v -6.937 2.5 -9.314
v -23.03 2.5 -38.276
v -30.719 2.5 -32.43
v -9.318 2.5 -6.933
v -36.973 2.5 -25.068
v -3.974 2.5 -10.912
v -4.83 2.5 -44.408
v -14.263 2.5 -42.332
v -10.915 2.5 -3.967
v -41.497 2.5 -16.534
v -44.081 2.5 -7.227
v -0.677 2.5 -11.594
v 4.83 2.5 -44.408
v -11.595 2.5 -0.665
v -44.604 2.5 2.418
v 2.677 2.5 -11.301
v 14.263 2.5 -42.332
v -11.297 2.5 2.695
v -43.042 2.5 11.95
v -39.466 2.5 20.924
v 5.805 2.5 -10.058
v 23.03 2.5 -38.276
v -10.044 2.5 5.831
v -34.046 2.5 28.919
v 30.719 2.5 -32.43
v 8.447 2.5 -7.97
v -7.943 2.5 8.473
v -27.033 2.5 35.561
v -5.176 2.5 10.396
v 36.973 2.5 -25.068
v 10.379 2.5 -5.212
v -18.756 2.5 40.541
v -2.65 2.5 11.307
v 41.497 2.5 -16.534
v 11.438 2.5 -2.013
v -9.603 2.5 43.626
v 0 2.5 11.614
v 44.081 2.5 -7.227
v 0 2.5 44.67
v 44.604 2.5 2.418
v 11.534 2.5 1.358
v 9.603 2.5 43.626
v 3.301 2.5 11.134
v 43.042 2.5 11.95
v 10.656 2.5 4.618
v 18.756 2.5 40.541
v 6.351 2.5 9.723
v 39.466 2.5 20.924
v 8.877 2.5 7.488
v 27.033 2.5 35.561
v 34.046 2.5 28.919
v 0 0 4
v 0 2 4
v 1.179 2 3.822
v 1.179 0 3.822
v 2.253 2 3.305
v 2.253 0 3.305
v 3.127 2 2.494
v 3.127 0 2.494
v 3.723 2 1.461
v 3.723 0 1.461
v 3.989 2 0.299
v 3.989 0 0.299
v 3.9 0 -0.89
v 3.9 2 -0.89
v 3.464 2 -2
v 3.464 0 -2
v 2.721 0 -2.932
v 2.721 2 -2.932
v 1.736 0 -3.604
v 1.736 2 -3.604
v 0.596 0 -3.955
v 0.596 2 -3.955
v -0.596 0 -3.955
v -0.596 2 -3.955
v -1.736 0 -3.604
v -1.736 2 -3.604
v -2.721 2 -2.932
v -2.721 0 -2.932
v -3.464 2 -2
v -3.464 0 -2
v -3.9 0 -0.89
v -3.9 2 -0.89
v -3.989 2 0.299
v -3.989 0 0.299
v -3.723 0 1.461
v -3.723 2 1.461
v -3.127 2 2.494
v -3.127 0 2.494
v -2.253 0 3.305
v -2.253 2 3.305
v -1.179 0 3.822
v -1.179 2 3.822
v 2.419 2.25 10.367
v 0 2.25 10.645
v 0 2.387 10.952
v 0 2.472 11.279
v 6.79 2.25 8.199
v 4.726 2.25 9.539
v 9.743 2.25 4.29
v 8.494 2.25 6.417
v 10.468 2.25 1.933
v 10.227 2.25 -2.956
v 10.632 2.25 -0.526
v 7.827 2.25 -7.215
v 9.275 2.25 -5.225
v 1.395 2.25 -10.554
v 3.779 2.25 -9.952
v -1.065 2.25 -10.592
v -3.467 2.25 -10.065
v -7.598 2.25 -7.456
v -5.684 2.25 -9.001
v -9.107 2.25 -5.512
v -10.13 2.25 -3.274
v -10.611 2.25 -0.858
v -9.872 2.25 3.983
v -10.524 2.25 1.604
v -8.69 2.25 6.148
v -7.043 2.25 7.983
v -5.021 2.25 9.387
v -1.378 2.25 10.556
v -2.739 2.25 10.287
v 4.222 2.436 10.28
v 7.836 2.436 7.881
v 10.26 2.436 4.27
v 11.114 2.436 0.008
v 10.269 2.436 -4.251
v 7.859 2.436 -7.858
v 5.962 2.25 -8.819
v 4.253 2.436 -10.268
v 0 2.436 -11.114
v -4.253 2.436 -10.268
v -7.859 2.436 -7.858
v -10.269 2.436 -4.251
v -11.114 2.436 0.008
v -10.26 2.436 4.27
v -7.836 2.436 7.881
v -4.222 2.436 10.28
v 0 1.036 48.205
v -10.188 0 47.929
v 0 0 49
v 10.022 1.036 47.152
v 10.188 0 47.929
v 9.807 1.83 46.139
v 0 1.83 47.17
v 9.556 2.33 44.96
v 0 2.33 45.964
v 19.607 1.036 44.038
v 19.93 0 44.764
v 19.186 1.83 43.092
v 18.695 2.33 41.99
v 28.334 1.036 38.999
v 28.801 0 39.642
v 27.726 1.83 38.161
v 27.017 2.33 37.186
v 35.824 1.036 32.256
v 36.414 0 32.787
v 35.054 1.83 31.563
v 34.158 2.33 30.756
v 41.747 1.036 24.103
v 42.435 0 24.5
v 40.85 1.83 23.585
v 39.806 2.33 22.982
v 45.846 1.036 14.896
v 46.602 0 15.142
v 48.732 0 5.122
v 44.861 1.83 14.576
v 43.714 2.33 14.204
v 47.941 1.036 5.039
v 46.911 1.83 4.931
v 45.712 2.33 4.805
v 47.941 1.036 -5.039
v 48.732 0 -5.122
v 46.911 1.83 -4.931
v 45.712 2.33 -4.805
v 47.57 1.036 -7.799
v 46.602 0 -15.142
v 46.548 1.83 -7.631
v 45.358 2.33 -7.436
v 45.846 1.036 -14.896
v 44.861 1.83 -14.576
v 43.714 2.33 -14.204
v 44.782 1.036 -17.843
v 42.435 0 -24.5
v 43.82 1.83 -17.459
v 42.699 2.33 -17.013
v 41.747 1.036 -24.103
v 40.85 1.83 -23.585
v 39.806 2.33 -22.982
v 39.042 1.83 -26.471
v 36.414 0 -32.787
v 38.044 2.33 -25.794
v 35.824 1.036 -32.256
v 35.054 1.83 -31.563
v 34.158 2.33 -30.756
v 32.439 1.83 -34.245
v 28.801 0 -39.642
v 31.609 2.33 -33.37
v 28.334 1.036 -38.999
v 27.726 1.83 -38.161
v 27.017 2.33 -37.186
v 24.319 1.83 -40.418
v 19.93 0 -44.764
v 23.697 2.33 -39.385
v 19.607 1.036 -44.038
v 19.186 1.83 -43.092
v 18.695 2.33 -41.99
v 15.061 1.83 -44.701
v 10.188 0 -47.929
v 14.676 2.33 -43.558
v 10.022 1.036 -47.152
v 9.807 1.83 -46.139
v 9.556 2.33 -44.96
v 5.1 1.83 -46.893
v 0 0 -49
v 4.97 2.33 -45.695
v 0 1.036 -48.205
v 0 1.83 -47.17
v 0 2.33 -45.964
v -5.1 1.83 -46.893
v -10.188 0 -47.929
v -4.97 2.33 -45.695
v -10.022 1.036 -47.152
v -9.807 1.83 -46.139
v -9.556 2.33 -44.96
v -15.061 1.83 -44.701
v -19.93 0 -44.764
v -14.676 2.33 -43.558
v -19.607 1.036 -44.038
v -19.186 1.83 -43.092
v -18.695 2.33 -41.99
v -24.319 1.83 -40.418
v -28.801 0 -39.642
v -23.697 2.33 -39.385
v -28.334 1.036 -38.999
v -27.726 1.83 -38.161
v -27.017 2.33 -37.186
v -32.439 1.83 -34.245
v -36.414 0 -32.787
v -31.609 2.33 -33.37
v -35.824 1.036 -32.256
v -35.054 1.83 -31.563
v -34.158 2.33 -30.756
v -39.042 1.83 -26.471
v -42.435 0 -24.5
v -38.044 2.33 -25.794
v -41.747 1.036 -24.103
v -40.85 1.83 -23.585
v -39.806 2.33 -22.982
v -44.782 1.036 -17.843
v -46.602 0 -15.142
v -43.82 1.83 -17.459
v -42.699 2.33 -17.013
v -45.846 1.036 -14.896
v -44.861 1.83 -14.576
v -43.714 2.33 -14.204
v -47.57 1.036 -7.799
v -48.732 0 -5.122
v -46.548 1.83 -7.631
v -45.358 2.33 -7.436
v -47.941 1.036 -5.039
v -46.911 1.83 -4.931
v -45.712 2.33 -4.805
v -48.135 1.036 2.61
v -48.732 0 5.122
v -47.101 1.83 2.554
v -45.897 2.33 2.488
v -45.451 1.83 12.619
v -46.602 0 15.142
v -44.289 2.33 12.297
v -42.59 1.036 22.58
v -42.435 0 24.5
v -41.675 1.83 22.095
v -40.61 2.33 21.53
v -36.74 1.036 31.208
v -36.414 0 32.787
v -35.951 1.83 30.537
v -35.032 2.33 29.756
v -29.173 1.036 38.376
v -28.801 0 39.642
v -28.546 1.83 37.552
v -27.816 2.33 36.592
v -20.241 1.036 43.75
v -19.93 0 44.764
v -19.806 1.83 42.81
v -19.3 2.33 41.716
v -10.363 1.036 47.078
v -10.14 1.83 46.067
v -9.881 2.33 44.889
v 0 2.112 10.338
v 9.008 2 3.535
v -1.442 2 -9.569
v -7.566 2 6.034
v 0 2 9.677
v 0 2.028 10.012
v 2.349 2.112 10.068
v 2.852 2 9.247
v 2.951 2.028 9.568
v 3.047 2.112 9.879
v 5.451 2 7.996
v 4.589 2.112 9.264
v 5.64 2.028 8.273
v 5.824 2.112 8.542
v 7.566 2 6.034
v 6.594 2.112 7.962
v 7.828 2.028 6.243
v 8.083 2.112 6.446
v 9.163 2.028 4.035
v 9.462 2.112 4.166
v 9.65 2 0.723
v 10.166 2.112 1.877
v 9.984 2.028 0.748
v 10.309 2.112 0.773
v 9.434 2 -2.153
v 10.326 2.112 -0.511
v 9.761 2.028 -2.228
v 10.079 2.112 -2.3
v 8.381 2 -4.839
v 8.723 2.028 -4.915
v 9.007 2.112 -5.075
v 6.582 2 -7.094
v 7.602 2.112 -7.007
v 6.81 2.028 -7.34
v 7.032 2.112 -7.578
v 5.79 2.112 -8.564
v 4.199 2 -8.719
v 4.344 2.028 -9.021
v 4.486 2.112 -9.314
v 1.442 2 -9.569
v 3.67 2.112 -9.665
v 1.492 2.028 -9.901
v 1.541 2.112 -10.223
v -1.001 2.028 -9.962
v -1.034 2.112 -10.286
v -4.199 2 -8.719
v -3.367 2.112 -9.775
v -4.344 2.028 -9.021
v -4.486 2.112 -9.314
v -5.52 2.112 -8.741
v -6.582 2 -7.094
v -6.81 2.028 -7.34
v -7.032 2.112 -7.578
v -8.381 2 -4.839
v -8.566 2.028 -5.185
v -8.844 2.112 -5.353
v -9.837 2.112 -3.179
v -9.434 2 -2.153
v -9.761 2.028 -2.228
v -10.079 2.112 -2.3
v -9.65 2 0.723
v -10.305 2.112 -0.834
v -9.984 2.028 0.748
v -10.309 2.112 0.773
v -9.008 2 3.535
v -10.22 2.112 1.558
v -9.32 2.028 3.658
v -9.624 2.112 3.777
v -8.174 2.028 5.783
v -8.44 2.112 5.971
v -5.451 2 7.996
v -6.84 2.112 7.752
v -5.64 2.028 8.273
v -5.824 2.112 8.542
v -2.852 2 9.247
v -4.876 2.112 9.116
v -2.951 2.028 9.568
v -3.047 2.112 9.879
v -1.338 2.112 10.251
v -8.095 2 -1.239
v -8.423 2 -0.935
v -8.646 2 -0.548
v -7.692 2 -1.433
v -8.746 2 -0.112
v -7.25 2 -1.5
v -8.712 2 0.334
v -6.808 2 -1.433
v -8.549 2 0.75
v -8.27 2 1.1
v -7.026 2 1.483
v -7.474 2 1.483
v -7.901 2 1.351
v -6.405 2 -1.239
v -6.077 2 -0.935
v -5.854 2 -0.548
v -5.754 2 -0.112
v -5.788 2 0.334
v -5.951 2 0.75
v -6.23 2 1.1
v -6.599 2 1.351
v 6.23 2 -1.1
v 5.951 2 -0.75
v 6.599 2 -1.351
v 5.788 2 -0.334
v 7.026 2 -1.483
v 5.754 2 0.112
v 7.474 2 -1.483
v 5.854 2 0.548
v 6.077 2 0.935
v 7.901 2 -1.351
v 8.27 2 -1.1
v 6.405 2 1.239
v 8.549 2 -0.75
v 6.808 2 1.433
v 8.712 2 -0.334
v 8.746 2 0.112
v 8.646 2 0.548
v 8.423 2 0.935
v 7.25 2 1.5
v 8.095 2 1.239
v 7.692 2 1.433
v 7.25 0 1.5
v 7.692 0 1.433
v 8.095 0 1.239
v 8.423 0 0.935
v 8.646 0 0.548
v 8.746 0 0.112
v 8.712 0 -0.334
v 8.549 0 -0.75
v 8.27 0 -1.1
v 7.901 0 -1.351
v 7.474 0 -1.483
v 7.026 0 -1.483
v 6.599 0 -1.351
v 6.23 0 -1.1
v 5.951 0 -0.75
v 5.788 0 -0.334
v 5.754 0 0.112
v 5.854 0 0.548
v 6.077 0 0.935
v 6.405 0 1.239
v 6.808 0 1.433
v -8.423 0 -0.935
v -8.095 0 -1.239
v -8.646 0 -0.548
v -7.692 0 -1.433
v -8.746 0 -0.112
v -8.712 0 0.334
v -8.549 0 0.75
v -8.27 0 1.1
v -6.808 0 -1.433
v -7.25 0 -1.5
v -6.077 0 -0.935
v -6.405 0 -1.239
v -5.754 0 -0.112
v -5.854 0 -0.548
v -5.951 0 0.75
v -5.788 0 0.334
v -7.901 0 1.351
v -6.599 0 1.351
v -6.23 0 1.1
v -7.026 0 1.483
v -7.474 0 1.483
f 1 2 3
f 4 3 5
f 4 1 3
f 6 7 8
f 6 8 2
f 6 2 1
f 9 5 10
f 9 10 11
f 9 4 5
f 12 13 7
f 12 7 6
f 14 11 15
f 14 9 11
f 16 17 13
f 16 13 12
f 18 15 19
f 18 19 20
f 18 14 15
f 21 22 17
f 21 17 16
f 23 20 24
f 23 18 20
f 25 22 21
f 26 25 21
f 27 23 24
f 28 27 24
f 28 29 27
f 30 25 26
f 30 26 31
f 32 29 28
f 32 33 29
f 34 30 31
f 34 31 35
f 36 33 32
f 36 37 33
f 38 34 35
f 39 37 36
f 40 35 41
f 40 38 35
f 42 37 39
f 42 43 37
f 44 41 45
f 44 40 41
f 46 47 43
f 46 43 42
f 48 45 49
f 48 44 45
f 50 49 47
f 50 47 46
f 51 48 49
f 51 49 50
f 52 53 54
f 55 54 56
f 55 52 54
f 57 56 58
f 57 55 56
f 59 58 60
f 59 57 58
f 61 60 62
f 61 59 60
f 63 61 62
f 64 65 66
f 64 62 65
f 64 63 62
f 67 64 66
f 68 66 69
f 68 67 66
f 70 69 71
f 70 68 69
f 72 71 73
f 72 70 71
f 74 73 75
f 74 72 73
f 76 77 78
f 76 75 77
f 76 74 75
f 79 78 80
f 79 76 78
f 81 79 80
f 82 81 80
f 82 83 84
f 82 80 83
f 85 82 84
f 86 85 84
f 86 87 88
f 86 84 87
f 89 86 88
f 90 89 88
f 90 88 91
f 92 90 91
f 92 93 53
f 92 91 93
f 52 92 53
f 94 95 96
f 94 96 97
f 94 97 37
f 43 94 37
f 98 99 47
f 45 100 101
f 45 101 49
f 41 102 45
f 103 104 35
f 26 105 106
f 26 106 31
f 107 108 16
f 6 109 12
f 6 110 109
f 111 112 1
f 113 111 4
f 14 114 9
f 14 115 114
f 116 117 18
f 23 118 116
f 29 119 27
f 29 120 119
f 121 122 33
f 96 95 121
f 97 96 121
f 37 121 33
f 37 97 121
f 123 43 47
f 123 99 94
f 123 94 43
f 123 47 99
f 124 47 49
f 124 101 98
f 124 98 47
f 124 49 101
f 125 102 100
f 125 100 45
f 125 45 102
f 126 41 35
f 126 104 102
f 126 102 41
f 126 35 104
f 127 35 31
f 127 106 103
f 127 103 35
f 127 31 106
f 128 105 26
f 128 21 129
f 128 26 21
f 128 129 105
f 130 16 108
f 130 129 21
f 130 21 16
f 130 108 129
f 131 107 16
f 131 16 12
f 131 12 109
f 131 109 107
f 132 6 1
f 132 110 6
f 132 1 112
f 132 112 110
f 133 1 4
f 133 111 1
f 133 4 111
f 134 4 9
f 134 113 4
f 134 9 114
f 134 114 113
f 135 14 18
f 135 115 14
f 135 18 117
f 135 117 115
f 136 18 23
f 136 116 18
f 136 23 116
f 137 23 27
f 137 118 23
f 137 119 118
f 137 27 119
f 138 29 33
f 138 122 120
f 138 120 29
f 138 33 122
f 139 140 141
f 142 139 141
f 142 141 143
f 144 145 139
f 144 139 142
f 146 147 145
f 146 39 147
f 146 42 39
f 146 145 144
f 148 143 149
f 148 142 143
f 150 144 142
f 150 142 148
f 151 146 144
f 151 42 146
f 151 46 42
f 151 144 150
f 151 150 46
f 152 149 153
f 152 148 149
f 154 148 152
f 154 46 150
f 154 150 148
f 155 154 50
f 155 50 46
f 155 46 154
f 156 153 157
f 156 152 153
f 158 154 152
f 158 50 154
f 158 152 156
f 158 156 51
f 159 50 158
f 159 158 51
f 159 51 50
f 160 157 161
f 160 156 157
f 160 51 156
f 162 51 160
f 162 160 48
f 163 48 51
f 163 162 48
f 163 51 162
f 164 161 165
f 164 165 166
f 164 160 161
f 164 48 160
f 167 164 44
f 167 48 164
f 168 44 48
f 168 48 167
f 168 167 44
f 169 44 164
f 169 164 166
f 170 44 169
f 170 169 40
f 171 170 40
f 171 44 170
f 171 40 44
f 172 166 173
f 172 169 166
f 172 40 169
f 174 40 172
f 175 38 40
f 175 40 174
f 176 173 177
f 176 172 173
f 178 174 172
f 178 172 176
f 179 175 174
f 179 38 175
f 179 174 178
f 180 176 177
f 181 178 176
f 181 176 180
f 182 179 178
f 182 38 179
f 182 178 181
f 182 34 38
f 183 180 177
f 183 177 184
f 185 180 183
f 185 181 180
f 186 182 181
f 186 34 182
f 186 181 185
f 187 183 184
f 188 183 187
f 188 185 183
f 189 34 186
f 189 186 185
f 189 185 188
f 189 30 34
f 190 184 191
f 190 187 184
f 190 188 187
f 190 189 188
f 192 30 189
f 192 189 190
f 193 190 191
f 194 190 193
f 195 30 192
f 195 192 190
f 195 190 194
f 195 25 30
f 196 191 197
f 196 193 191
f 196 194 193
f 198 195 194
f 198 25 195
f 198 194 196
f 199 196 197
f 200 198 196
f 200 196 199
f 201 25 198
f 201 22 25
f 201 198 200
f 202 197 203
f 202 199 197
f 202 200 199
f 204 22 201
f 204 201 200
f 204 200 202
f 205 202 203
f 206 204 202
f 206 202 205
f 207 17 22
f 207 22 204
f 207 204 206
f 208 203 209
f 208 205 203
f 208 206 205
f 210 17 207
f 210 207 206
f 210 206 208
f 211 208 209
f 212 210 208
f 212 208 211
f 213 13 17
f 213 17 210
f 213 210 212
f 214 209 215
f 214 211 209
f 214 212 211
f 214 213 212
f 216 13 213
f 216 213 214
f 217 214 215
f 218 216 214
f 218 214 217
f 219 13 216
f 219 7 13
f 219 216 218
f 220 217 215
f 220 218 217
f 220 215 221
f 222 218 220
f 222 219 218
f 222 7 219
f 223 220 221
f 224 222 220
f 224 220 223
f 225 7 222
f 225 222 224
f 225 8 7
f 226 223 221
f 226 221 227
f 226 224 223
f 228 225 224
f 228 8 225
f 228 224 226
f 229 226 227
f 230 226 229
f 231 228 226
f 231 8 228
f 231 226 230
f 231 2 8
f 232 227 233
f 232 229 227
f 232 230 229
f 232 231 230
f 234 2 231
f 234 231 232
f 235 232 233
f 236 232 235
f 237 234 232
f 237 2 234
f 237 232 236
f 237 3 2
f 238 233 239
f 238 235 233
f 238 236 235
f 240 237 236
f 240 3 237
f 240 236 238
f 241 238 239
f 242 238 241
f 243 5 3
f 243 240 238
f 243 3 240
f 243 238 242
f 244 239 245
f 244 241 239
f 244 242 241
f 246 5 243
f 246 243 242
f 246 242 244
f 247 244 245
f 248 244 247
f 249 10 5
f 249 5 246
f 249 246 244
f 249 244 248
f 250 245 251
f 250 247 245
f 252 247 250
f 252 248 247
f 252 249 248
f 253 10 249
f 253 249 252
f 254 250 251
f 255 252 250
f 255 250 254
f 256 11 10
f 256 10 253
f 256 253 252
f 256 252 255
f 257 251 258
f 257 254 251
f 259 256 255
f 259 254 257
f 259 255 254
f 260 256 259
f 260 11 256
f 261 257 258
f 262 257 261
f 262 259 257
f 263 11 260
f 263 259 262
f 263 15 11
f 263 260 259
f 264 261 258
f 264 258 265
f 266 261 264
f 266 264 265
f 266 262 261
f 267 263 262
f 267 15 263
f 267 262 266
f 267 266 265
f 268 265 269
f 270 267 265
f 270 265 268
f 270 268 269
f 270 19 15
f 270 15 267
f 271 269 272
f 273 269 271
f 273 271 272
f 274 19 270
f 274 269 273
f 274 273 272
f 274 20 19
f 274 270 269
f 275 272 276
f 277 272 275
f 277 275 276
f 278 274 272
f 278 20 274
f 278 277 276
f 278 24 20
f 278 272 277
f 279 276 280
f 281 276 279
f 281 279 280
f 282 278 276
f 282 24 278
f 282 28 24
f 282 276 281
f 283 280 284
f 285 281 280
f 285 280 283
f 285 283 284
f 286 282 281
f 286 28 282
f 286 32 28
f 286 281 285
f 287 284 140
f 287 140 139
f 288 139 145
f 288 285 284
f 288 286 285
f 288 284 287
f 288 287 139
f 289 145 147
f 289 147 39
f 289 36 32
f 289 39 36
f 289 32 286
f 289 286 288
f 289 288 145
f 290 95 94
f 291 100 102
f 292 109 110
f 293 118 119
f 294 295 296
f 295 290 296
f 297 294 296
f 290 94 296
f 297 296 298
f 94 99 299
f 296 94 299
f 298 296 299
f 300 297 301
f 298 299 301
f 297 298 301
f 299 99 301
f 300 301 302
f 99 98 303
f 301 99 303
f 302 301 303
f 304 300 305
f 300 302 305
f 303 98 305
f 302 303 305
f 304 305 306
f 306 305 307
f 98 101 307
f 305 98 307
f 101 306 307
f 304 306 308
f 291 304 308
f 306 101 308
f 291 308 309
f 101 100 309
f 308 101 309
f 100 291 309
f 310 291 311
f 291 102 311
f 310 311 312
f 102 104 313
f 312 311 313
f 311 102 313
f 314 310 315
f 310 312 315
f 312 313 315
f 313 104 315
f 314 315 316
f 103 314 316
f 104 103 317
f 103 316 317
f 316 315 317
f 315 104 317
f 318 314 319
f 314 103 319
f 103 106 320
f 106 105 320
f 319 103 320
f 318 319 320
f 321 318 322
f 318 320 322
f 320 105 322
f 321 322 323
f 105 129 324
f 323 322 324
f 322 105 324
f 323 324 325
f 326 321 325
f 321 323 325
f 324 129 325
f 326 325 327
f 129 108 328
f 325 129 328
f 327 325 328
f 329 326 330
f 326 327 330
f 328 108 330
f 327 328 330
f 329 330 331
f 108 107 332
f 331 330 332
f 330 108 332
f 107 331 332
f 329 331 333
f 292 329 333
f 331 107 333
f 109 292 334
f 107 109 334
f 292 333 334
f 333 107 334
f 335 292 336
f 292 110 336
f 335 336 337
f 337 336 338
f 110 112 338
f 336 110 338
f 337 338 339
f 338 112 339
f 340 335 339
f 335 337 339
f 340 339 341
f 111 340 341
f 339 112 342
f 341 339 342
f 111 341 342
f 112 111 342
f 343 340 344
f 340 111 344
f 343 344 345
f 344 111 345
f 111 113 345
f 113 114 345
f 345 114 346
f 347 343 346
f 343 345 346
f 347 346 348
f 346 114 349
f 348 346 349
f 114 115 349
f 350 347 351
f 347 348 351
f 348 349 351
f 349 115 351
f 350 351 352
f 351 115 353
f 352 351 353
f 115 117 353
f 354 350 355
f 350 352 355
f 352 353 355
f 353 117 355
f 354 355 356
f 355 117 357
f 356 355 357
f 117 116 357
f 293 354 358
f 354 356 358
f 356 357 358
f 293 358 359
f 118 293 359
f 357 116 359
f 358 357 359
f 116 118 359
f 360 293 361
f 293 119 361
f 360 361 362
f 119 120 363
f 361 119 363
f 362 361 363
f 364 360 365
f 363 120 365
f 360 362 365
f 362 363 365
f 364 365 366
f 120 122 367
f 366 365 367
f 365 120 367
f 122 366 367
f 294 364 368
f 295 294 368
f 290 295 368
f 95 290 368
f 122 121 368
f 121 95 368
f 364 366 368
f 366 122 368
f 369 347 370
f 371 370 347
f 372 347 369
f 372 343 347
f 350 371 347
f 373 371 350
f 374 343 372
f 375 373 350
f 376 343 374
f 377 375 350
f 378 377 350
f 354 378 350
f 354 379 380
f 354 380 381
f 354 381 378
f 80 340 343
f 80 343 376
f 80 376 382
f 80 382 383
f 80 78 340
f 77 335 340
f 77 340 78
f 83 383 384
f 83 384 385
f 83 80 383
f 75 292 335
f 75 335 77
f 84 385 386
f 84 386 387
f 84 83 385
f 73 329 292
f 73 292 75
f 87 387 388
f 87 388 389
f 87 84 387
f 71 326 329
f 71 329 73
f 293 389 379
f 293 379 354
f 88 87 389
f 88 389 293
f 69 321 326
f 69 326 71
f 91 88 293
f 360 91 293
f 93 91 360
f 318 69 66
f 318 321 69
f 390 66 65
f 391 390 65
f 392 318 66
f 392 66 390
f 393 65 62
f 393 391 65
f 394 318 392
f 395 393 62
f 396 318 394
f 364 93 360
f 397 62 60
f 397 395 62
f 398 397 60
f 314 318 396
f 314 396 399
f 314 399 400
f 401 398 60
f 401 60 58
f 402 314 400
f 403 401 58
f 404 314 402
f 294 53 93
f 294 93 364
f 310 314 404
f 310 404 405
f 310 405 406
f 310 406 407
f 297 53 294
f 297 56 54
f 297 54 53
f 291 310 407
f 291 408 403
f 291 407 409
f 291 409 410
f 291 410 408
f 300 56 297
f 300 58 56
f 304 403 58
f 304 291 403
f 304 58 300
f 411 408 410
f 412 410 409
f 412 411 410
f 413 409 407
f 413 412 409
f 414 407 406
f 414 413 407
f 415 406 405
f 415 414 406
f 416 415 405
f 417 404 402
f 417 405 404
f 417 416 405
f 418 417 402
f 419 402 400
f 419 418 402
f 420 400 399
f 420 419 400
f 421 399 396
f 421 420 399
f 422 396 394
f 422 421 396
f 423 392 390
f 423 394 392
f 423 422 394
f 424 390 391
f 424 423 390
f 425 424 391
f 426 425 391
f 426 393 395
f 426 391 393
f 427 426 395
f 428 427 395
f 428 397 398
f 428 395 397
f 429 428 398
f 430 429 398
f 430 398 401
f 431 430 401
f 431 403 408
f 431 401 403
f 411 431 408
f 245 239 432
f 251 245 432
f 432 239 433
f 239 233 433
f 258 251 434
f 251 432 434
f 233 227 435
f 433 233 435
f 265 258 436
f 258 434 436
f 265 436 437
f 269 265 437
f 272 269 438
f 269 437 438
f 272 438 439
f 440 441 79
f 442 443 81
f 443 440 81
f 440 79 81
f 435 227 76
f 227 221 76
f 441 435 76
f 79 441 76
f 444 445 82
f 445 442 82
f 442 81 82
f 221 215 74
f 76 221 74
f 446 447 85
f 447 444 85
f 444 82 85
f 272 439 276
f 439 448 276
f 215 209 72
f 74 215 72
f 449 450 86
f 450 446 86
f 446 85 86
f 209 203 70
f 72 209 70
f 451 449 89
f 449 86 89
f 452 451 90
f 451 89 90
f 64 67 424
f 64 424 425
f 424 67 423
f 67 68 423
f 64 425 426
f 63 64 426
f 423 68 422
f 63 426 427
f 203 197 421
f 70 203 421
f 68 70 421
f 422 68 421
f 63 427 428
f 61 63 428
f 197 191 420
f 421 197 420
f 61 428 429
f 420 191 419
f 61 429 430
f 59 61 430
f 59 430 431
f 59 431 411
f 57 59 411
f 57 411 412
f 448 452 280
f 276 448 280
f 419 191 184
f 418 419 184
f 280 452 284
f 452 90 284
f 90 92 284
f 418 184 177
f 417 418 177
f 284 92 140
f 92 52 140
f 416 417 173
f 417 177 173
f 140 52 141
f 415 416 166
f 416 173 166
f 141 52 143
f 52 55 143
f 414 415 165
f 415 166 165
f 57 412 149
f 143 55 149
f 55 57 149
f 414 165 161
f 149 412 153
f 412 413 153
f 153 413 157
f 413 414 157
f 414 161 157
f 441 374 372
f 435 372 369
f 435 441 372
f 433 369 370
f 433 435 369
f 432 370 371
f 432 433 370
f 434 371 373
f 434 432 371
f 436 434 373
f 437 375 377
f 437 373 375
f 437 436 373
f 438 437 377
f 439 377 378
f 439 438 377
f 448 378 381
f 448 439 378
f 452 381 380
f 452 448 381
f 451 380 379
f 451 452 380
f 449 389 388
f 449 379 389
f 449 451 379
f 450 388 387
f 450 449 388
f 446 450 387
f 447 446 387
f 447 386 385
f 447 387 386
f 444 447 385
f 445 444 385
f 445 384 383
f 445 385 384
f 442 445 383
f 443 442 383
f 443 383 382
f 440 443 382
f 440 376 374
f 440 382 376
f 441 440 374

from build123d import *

# Parameters (mm, degrees)
CROQUIS1_R              = 49
CROQUIS1_R_2            = 4
CROQUIS1_R_3            = 1.5
SALIENTE_EXTRUIR1_DEPTH = 2.5
CROQUIS2_R              = 11
CORTAR_EXTRUIR1_DEPTH   = 0.5
REDONDEO1_R             = 2
REDONDEO2_R             = 2
REDONDEO3_R             = 5


with BuildPart() as part:
    # Croquis1 → Saliente-Extruir1 (new body)
    with BuildSketch(Plane(origin=(0, 0, 0), x_dir=(1, 0, 0), z_dir=(0, 1, 0))):
        with Locations(Location((0, 0, 0), (0, 0, 270))):
            Circle(CROQUIS1_R)
        with Locations(Location((0, 0, 0), (0, 0, 270))):
            Circle(CROQUIS1_R_2, mode=Mode.SUBTRACT)
        with Locations(Location((7.25, 0, 0), (0, 0, 270))):
            Circle(CROQUIS1_R_3, mode=Mode.SUBTRACT)
        with Locations(Location((-7.25, 0, 0), (0, 0, 90))):
            Circle(CROQUIS1_R_3, mode=Mode.SUBTRACT)
    extrude(amount=SALIENTE_EXTRUIR1_DEPTH)

    # Croquis2 → Cortar-Extruir1 (cut)
    with BuildSketch(Plane(origin=(0, 2.5, 0), x_dir=(1, 0, 0), z_dir=(0, 1, 0))):
        with Locations(Location((0, 0, 0), (0, 0, 270))):
            Circle(CROQUIS2_R)
    extrude(amount=-CORTAR_EXTRUIR1_DEPTH, mode=Mode.SUBTRACT)

    # Redondeo1
    # the kernel refuses this fillet: 2 mm, written as the material it adds along each edge
    with BuildSketch(Plane(origin=(0, 2, 0), x_dir=(0, 0, 1), z_dir=(-1, 0, 0))) as redondeo1_piece_1:
        with BuildLine():
            CenterArc((9.677124344, 2), REDONDEO1_R, 270, 41.409622109)
            Line((9.677124344, 0), (9.677124344, -0.04))
            Line((9.677124344, -0.04), (11, -0.04))
            Line((11, -0.04), (11.04, 0))
            ThreePointArc((11.04, 0), (11.04, 0.25), (11.026457513, 0.47))
            Line((11.026457513, 0.47), (11, 0.5))
        make_face()
    revolve(axis=Axis((0, 2, 0), (0, 1, 0)))

    # Redondeo2
    redondeo2_edges = [part.edges().sort_by_distance(p)[0] for p in [
        (0, 2.5, -11),
    ]]
    fillet(redondeo2_edges, radius=REDONDEO2_R)

    # Redondeo3
    # the kernel refuses this fillet: 5 mm, written as the material it takes off along each edge
    with BuildSketch(Plane(origin=(0, 2.5, 0), x_dir=(0, 0, 1), z_dir=(-1, 0, 0))) as redondeo3_piece_1:
        with BuildLine():
            CenterArc((44.669872981, -5), REDONDEO3_R, 30, 60)
            Line((49, -2.5), (49.08660254, -2.45))
            ThreePointArc((49.08660254, -2.45), (49.1, -1.25), (49.1, 0))
            Line((49.1, 0), (49, 0.1))
            Line((49, 0.1), (44.669872981, 0.1))
            Line((44.669872981, 0.1), (44.669872981, 0))
        make_face()
    revolve(axis=Axis((0, 2.5, 0), (0, 1, 0)), mode=Mode.SUBTRACT)


solid = part.part
